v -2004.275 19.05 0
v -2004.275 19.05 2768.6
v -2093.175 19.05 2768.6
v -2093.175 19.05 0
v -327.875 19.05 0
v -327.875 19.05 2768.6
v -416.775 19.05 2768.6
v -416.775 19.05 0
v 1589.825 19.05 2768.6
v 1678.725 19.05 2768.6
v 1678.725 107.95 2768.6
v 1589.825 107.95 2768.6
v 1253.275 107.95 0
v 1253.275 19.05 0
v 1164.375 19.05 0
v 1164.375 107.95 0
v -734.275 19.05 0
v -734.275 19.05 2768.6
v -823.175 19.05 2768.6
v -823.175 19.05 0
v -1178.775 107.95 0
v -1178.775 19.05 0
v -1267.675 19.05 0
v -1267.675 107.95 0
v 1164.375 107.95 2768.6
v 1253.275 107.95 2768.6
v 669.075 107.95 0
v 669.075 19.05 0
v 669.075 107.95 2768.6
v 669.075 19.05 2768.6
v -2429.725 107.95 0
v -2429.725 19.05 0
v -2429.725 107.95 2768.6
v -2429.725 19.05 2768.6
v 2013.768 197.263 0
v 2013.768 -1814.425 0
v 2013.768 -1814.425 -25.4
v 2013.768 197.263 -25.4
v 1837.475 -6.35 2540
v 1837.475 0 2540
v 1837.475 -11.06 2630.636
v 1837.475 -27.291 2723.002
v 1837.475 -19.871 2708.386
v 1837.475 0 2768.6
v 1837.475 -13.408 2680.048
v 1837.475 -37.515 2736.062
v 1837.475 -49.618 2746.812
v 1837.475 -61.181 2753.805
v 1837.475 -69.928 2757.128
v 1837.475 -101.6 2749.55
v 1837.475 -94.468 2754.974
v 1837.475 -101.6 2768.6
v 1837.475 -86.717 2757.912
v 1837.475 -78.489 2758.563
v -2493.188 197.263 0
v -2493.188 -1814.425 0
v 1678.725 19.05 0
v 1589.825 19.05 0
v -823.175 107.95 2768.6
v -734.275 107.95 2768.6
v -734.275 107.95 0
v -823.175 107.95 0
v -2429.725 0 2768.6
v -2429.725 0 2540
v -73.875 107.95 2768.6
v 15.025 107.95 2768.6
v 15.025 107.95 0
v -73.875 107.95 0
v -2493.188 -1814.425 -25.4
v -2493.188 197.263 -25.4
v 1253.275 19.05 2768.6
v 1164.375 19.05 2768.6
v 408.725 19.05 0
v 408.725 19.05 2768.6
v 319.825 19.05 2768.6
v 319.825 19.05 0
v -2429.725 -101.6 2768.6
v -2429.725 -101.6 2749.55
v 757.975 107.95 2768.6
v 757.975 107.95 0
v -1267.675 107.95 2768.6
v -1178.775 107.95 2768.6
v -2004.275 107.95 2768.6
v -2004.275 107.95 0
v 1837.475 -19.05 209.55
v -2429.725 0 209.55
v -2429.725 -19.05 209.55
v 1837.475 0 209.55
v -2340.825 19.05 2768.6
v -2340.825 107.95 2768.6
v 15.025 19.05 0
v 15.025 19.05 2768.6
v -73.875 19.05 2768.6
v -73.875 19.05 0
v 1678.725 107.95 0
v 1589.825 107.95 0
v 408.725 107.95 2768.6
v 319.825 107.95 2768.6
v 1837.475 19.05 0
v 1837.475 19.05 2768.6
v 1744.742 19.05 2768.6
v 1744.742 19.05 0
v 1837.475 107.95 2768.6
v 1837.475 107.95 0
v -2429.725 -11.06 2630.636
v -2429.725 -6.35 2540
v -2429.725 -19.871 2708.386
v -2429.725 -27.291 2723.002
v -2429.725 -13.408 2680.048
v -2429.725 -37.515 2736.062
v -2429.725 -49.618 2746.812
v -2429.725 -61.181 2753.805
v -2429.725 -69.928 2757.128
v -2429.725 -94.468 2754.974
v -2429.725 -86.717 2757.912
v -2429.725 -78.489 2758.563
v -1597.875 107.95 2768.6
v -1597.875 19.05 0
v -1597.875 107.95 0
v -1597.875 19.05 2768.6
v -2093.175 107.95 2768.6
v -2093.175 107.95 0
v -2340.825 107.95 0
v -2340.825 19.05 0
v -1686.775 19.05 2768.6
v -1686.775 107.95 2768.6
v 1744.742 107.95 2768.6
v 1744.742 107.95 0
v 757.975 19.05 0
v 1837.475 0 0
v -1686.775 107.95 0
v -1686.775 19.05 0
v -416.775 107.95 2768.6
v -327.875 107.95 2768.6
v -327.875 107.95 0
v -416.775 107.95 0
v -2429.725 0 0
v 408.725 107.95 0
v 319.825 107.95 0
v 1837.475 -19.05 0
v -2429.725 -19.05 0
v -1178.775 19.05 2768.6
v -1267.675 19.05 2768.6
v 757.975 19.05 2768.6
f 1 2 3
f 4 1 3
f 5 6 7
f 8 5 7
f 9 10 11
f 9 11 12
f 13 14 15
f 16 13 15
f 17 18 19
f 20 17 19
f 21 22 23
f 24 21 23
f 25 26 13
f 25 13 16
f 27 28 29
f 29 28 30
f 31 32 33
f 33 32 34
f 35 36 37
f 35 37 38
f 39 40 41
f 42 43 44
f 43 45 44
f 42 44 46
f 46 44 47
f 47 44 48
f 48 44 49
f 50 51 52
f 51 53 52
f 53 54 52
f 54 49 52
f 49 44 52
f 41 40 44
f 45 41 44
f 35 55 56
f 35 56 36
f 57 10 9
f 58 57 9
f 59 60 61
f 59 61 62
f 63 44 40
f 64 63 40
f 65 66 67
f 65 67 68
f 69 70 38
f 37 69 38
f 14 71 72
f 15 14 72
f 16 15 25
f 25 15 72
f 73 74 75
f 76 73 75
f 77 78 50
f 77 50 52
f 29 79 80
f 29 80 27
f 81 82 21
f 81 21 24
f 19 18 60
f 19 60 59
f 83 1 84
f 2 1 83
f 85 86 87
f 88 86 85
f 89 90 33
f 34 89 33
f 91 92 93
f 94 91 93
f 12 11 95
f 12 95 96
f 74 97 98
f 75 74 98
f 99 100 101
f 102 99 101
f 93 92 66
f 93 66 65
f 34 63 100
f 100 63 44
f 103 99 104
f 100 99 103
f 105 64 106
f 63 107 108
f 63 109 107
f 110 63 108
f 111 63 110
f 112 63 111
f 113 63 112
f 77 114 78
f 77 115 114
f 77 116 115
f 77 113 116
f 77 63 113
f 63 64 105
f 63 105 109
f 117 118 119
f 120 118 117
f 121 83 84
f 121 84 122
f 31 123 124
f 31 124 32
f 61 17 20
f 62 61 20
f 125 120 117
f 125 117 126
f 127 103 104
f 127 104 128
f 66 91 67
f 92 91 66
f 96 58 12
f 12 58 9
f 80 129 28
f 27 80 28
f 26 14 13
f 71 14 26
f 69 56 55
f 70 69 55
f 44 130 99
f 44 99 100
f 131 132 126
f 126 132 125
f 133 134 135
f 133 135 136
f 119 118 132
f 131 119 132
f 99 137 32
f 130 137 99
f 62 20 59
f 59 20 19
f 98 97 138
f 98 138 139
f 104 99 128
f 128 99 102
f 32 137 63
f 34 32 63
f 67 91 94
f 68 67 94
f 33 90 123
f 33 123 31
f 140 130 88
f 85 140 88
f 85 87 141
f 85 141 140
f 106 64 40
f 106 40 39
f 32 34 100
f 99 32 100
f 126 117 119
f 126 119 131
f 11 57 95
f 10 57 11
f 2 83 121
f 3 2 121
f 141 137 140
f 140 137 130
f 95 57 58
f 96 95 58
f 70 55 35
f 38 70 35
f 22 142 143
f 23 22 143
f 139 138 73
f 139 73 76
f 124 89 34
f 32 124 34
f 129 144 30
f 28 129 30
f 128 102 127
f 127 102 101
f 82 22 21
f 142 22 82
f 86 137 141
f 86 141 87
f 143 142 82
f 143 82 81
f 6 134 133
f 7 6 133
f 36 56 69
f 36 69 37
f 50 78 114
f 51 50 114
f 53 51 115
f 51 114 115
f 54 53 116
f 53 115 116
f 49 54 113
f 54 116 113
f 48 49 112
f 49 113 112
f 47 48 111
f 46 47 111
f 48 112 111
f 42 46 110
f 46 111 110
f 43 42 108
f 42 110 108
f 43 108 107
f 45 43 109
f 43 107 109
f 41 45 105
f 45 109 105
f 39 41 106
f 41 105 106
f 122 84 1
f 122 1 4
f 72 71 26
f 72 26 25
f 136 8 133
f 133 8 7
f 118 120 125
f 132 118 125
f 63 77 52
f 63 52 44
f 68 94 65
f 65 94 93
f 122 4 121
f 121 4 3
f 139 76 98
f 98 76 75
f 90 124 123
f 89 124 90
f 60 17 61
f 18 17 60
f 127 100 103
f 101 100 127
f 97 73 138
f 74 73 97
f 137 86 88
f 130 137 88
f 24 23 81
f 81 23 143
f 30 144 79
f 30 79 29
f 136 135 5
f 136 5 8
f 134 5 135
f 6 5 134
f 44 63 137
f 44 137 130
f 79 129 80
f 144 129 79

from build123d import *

# Parameters (mm, degrees)
F0_W     = 4267.2
F0_H     = 2768.6
F1_DEPTH = 19.05
F2_W     = 88.9
F2_H     = 2768.6
F3_DEPTH = 88.9
F2_W_2   = 92.7331652709
F4_W     = 4267.2
F4_H     = 209.55
F5_DEPTH = 19.05
F7_DEPTH = 4267.2
F8_W     = 4506.9556236267
F8_H     = 2011.68833673
F9_DEPTH = 25.4


with BuildPart() as f1:
    # F0 (on Front) → F1 (new body)
    with BuildSketch(Plane.XZ):
        with Locations((-296.1249180726, 1384.3)):
            Rectangle(F0_W, F0_H)
    extrude(amount=-F1_DEPTH)


with BuildPart() as f3:
    # F2 (on face) → F3 (new body)
    with BuildSketch(Plane(origin=(0, 19.05, 0), x_dir=(-1, 0, 0), z_dir=(0, 1, 0))):
        with Locations((2385.2749180726, 1384.3)):
            Rectangle(F2_W, F2_H)
    extrude(amount=F3_DEPTH)


with BuildPart() as f3b:
    # F2 (on face) → F3, piece 2 (new body)
    with BuildSketch(Plane(origin=(0, 19.05, 0), x_dir=(-1, 0, 0), z_dir=(0, 1, 0))):
        with Locations((-1791.108499292, 1384.3)):
            Rectangle(F2_W_2, F2_H)
    extrude(amount=F3_DEPTH)


with BuildPart() as f3c:
    # F2 (on face) → F3, piece 3 (new body)
    with BuildSketch(Plane(origin=(0, 19.05, 0), x_dir=(-1, 0, 0), z_dir=(0, 1, 0))):
        with Locations((2048.7249180726, 1384.3)):
            Rectangle(F2_W, F2_H)
    extrude(amount=F3_DEPTH)


with BuildPart() as f3d:
    # F2 (on face) → F3, piece 4 (new body)
    with BuildSketch(Plane(origin=(0, 19.05, 0), x_dir=(-1, 0, 0), z_dir=(0, 1, 0))):
        with Locations((1642.3249180726, 1384.3)):
            Rectangle(F2_W, F2_H)
    extrude(amount=F3_DEPTH)


with BuildPart() as f3e:
    # F2 (on face) → F3, piece 5 (new body)
    with BuildSketch(Plane(origin=(0, 19.05, 0), x_dir=(-1, 0, 0), z_dir=(0, 1, 0))):
        with Locations((1223.2249180726, 1384.3)):
            Rectangle(F2_W, F2_H)
    extrude(amount=F3_DEPTH)


with BuildPart() as f3f:
    # F2 (on face) → F3, piece 6 (new body)
    with BuildSketch(Plane(origin=(0, 19.05, 0), x_dir=(-1, 0, 0), z_dir=(0, 1, 0))):
        with Locations((778.7249180726, 1384.3)):
            Rectangle(F2_W, F2_H)
    extrude(amount=F3_DEPTH)


with BuildPart() as f3g:
    # F2 (on face) → F3, piece 7 (new body)
    with BuildSketch(Plane(origin=(0, 19.05, 0), x_dir=(-1, 0, 0), z_dir=(0, 1, 0))):
        with Locations((372.3249180726, 1384.3)):
            Rectangle(F2_W, F2_H)
    extrude(amount=F3_DEPTH)


with BuildPart() as f3h:
    # F2 (on face) → F3, piece 8 (new body)
    with BuildSketch(Plane(origin=(0, 19.05, 0), x_dir=(-1, 0, 0), z_dir=(0, 1, 0))):
        with Locations((29.4249180726, 1384.3)):
            Rectangle(F2_W, F2_H)
    extrude(amount=F3_DEPTH)


with BuildPart() as f3i:
    # F2 (on face) → F3, piece 9 (new body)
    with BuildSketch(Plane(origin=(0, 19.05, 0), x_dir=(-1, 0, 0), z_dir=(0, 1, 0))):
        with Locations((-364.2750819274, 1384.3)):
            Rectangle(F2_W, F2_H)
    extrude(amount=F3_DEPTH)


with BuildPart() as f3j:
    # F2 (on face) → F3, piece 10 (new body)
    with BuildSketch(Plane(origin=(0, 19.05, 0), x_dir=(-1, 0, 0), z_dir=(0, 1, 0))):
        with Locations((-713.5250819274, 1384.3)):
            Rectangle(F2_W, F2_H)
    extrude(amount=F3_DEPTH)


with BuildPart() as f3k:
    # F2 (on face) → F3, piece 11 (new body)
    with BuildSketch(Plane(origin=(0, 19.05, 0), x_dir=(-1, 0, 0), z_dir=(0, 1, 0))):
        with Locations((-1208.8250819274, 1384.3)):
            Rectangle(F2_W, F2_H)
    extrude(amount=F3_DEPTH)


with BuildPart() as f3l:
    # F2 (on face) → F3, piece 12 (new body)
    with BuildSketch(Plane(origin=(0, 19.05, 0), x_dir=(-1, 0, 0), z_dir=(0, 1, 0))):
        with Locations((-1634.2750819274, 1384.3)):
            Rectangle(F2_W, F2_H)
    extrude(amount=F3_DEPTH)


with BuildPart() as f5:
    # F4 (on face) → F5 (new body)
    with BuildSketch(Plane.XZ):
        with Locations((-296.1249180726, 104.775)):
            Rectangle(F4_W, F4_H)
    extrude(amount=F5_DEPTH)


with BuildPart() as f7:
    # F6 (on face) → F7 (new body, through all)
    with BuildSketch(Plane(origin=(-2429.7249180726, 0, 0), x_dir=(0, -1, 0), z_dir=(-1, 0, 0))):
        with BuildLine():
            Line((101.6, 2768.6), (0, 2768.6))
            Line((0, 2768.6), (0, 2540))
            Line((0, 2540), (6.35, 2540))
            add(Edge.make_bspline(
                [(101.6, 2749.55), (91.5826724048, 2759.5050639064), (63.0477493205, 2762.1295266592), (13.1480534698, 2716.5194241679), (11.6453144693, 2642.5524805079), (9.1553326848, 2572.672698402), (6.35, 2540)],
                knots=[0, 0, 0, 0, 0.1852229886, 0.42229431, 0.6858801593, 1, 1, 1, 1], degree=3))
            Line((101.6, 2749.55), (101.6, 2768.6))
        make_face()
    extrude(amount=-F7_DEPTH)


with BuildPart() as f9:
    # F8 (on Top) → F9 (new body)
    with BuildSketch(Plane.XY):
        with Locations((-239.709854126, -808.5811808705)):
            Rectangle(F8_W, F8_H)
    extrude(amount=-F9_DEPTH)


solid = Compound([f1.part, f3.part, f3b.part, f3c.part, f3d.part, f3e.part, f3f.part, f3g.part, f3h.part, f3i.part, f3j.part, f3k.part, f3l.part, f5.part, f7.part, f9.part])
